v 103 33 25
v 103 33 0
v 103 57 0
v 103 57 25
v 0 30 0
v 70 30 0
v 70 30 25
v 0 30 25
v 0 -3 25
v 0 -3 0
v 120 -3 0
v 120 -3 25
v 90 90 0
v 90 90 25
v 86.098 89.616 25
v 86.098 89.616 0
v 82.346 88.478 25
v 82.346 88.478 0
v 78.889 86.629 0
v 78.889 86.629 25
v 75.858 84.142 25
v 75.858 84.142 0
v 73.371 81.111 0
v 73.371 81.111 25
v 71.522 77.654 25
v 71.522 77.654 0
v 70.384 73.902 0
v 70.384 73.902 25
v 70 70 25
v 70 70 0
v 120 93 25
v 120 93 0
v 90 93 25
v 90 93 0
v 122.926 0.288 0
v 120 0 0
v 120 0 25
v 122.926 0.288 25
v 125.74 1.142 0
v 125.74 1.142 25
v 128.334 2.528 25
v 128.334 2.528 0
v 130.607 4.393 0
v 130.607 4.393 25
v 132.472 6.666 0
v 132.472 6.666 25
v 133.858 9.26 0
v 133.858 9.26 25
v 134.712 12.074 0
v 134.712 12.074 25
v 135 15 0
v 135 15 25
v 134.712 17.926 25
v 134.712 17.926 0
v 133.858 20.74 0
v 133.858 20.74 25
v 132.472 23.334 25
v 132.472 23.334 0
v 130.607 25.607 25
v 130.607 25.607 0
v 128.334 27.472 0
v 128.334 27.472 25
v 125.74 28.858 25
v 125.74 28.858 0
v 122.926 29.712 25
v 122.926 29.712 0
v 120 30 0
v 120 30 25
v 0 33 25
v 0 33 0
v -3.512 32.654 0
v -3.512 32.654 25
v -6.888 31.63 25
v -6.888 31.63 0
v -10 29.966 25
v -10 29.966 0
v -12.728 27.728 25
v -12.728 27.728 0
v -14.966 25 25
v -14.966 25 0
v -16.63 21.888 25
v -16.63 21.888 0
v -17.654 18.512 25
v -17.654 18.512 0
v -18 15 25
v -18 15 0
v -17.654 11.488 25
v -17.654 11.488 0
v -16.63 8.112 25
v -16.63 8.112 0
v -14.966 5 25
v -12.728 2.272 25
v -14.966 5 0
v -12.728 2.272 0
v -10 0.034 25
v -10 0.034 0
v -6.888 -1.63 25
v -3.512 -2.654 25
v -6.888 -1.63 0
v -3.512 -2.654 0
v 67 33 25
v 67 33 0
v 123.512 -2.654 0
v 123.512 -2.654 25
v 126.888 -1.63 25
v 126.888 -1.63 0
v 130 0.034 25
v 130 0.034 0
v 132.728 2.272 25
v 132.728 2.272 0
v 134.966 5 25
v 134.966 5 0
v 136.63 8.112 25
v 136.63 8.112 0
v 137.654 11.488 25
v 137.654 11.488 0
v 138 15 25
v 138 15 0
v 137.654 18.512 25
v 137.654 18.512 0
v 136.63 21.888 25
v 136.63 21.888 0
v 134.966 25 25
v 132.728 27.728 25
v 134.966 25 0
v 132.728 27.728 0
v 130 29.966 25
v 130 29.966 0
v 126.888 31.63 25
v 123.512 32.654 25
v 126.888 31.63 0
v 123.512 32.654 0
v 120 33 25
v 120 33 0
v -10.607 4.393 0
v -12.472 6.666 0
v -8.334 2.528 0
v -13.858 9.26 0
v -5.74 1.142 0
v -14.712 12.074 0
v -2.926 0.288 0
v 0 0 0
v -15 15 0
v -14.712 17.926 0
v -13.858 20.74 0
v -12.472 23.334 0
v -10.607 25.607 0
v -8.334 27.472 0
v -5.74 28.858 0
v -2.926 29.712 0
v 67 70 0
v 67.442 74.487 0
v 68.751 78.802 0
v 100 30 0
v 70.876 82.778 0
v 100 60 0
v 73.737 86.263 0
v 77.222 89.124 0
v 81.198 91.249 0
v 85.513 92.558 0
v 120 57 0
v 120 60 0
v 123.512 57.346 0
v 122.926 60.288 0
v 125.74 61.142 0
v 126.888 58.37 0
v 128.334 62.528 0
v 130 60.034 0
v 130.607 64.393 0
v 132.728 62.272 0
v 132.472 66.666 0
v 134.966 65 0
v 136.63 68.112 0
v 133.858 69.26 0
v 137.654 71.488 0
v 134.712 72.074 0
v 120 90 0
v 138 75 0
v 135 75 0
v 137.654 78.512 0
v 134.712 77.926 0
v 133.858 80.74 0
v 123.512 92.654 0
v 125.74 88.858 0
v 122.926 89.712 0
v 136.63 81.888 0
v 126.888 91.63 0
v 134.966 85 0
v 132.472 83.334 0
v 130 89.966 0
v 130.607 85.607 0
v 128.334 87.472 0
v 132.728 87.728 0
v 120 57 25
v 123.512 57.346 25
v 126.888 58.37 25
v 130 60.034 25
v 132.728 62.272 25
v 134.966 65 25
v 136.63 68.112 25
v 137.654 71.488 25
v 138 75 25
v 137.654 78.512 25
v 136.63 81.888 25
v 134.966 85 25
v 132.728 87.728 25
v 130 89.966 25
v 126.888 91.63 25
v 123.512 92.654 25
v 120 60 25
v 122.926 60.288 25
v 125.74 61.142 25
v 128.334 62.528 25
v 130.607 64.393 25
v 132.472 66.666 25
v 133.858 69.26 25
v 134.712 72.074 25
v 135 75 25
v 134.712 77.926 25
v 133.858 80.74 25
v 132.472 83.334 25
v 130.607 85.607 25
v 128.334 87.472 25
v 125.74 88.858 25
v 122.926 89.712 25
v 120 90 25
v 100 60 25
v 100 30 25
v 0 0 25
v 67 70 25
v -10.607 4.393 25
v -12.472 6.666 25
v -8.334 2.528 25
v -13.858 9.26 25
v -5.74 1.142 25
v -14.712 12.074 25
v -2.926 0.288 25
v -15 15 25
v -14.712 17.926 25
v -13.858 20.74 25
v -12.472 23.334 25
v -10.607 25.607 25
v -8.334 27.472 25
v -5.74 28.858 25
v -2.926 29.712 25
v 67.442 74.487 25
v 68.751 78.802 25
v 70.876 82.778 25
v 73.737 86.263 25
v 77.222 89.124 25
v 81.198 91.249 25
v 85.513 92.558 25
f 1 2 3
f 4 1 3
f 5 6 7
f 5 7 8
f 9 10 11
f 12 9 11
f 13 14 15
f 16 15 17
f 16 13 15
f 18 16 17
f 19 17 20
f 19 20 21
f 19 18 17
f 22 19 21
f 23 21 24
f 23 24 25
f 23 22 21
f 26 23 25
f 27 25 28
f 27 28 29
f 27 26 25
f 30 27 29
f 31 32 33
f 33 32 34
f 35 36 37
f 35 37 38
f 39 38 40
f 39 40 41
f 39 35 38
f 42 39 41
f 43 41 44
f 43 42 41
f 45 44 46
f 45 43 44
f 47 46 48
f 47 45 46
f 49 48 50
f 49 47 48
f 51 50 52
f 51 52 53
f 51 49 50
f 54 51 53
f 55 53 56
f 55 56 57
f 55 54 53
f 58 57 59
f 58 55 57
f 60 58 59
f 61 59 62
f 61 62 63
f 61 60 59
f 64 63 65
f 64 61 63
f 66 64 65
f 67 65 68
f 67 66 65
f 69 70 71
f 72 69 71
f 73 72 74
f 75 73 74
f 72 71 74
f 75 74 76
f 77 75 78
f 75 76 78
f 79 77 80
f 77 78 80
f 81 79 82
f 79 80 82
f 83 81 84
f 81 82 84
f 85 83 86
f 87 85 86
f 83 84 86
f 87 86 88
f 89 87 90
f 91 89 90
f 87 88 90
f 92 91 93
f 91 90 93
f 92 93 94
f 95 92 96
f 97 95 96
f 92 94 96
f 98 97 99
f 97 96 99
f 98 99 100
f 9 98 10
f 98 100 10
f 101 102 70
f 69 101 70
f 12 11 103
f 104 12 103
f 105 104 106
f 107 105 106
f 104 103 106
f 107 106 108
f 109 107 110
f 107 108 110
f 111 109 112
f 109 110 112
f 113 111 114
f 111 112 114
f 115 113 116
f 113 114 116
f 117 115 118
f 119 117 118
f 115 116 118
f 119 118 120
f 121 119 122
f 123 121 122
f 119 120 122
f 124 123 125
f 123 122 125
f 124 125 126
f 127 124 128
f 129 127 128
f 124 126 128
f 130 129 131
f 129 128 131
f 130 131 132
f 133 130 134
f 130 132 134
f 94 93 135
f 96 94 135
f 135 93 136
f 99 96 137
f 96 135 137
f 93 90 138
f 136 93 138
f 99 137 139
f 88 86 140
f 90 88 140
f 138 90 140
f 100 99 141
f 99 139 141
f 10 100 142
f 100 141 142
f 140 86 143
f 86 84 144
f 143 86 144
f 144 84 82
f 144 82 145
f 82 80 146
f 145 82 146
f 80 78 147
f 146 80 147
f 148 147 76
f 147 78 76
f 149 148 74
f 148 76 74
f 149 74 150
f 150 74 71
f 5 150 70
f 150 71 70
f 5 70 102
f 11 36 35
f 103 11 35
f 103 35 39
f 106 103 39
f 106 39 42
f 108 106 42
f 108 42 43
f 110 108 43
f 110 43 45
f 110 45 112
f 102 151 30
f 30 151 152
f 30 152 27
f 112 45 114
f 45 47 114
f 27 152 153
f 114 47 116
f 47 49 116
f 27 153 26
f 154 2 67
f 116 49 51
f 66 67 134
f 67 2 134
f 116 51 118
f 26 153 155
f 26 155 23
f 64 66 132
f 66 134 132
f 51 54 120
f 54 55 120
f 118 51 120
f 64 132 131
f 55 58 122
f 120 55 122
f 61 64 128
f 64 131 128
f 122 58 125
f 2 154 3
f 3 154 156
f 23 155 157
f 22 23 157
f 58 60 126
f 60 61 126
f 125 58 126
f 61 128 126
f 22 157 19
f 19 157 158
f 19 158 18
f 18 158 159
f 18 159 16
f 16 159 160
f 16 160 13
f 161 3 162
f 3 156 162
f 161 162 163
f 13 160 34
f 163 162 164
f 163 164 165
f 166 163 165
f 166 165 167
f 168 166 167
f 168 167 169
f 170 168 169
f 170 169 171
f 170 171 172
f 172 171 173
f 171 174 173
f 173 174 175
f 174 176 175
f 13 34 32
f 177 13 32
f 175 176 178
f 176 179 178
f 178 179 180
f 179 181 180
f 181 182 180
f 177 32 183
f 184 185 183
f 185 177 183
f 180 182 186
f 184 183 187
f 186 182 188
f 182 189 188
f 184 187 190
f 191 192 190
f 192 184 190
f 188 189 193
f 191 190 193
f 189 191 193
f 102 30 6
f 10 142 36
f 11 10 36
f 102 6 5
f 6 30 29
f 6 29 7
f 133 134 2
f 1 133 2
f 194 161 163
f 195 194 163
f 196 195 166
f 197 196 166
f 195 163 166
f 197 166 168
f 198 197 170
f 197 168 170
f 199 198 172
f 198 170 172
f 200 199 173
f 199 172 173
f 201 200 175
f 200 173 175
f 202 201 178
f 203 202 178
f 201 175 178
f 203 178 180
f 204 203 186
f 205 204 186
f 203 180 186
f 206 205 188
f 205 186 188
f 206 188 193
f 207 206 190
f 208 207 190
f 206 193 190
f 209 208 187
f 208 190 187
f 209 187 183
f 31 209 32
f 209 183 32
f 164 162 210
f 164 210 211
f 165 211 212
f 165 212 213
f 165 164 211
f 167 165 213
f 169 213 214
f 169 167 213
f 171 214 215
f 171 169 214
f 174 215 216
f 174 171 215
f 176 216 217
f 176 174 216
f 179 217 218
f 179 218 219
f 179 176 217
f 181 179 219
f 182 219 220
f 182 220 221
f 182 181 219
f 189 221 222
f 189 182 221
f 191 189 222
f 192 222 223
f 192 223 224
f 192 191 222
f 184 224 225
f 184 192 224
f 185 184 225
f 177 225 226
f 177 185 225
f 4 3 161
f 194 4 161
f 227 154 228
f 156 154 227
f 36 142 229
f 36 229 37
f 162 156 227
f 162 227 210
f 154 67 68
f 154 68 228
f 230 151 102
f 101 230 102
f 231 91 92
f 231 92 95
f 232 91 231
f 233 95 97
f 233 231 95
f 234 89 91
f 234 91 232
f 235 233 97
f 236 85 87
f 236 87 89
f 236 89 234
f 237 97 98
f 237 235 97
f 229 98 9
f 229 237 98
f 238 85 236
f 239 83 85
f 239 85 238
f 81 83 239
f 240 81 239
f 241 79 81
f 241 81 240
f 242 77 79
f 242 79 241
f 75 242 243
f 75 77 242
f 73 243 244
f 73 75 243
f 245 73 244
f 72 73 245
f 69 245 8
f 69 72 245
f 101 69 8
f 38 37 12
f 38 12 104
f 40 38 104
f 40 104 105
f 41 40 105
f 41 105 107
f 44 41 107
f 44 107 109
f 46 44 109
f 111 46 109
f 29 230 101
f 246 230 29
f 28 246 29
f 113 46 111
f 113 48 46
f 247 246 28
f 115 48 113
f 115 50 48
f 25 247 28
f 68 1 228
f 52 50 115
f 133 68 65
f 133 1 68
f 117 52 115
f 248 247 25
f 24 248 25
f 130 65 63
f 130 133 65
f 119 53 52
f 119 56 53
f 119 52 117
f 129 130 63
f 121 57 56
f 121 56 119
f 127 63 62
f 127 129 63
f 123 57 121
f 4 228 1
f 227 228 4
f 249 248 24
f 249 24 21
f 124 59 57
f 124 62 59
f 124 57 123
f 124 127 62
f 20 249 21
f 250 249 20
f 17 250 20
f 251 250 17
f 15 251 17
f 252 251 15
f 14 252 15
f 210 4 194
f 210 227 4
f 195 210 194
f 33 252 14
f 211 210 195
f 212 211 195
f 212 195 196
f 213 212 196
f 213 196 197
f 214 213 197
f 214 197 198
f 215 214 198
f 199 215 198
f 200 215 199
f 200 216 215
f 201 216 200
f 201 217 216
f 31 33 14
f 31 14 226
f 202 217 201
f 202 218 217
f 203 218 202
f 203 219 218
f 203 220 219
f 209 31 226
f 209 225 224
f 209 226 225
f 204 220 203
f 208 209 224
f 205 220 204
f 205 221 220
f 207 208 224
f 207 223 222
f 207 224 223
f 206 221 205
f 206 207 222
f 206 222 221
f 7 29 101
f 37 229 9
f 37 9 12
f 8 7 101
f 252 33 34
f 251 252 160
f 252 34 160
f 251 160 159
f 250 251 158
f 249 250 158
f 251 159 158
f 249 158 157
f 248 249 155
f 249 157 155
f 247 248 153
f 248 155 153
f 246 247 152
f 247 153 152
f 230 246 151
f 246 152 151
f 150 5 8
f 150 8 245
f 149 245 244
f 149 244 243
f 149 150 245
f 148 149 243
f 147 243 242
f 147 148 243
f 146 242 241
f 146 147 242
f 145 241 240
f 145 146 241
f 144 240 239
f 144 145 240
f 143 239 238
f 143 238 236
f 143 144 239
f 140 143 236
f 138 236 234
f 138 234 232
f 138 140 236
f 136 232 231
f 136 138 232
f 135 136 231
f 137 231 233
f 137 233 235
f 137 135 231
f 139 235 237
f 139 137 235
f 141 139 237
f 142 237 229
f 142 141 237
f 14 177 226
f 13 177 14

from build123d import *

# Parameters (mm, degrees)
EXTRUDE_THIN11_DEPTH = 25


with BuildPart() as part:
    # Sketch2 → Extrude-Thin11 (new body)
    with BuildSketch(Plane.XY):
        with BuildLine():
            Line((67, 70), (67, 33))
            Line((67, 33), (0, 33))
            ThreePointArc((0, 33), (-18, 15), (0, -3))
            Line((0, -3), (120, -3))
            ThreePointArc((120, -3), (138, 15), (120, 33))
            Line((120, 33), (103, 33))
            Line((103, 33), (103, 57))
            Line((103, 57), (120, 57))
            ThreePointArc((120, 57), (138, 75), (120, 93))
            Line((120, 93), (90, 93))
            ThreePointArc((90, 93), (73.736544033, 86.263455967), (67, 70))
        make_face()
        with BuildLine():
            Line((70, 70), (70, 30))
            Line((70, 30), (0, 30))
            ThreePointArc((0, 30), (-15, 15), (0, 0))
            Line((0, 0), (120, 0))
            ThreePointArc((120, 0), (135, 15), (120, 30))
            Line((120, 30), (100, 30))
            Line((100, 30), (100, 60))
            Line((100, 60), (120, 60))
            ThreePointArc((120, 60), (135, 75), (120, 90))
            Line((120, 90), (90, 90))
            ThreePointArc((90, 90), (75.857864376, 84.142135624), (70, 70))
        make_face(mode=Mode.SUBTRACT)
    extrude(amount=EXTRUDE_THIN11_DEPTH)


solid = part.part
